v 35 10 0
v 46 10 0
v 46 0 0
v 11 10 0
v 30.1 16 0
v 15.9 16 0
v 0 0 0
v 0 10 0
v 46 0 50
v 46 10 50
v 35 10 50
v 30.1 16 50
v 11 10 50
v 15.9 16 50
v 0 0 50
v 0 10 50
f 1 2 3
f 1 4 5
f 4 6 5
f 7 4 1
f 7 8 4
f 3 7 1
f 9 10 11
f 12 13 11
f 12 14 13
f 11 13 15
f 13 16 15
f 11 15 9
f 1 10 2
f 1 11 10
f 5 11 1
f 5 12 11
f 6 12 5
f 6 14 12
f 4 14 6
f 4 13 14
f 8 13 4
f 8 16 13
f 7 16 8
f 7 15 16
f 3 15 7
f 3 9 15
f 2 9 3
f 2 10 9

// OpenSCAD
$fn = 32;

// ----------------------------------------------------------------------
// V guide rail: dovetail, 46 mm wide
// ----------------------------------------------------------------------

// --- parameters (mm) ---
rail_w = 46;              // rail width, X
base_t = 10;              // base plate thickness
v_depth = 6;              // V feature depth / height
v_half_w = 12;            // half width of the V at the base face
plate_t = 50;             // rail length, Z (the extrusion height)
top_half_w = 7.1;         // half width at the dovetail top

dovetail_base = 2 * v_half_w;  // dovetail width at the base
dovetail_top = 2 * top_half_w;  // dovetail width at the top

profile = [[0, 0], [46, 0], [46, 10], [35, 10], [30.1, 16], [15.9, 16], [11, 10], [0, 10]];  // primary outline, 8 points, counter clockwise

// --- the one profile operation ---
linear_extrude(height = plate_t) polygon(points = profile);
